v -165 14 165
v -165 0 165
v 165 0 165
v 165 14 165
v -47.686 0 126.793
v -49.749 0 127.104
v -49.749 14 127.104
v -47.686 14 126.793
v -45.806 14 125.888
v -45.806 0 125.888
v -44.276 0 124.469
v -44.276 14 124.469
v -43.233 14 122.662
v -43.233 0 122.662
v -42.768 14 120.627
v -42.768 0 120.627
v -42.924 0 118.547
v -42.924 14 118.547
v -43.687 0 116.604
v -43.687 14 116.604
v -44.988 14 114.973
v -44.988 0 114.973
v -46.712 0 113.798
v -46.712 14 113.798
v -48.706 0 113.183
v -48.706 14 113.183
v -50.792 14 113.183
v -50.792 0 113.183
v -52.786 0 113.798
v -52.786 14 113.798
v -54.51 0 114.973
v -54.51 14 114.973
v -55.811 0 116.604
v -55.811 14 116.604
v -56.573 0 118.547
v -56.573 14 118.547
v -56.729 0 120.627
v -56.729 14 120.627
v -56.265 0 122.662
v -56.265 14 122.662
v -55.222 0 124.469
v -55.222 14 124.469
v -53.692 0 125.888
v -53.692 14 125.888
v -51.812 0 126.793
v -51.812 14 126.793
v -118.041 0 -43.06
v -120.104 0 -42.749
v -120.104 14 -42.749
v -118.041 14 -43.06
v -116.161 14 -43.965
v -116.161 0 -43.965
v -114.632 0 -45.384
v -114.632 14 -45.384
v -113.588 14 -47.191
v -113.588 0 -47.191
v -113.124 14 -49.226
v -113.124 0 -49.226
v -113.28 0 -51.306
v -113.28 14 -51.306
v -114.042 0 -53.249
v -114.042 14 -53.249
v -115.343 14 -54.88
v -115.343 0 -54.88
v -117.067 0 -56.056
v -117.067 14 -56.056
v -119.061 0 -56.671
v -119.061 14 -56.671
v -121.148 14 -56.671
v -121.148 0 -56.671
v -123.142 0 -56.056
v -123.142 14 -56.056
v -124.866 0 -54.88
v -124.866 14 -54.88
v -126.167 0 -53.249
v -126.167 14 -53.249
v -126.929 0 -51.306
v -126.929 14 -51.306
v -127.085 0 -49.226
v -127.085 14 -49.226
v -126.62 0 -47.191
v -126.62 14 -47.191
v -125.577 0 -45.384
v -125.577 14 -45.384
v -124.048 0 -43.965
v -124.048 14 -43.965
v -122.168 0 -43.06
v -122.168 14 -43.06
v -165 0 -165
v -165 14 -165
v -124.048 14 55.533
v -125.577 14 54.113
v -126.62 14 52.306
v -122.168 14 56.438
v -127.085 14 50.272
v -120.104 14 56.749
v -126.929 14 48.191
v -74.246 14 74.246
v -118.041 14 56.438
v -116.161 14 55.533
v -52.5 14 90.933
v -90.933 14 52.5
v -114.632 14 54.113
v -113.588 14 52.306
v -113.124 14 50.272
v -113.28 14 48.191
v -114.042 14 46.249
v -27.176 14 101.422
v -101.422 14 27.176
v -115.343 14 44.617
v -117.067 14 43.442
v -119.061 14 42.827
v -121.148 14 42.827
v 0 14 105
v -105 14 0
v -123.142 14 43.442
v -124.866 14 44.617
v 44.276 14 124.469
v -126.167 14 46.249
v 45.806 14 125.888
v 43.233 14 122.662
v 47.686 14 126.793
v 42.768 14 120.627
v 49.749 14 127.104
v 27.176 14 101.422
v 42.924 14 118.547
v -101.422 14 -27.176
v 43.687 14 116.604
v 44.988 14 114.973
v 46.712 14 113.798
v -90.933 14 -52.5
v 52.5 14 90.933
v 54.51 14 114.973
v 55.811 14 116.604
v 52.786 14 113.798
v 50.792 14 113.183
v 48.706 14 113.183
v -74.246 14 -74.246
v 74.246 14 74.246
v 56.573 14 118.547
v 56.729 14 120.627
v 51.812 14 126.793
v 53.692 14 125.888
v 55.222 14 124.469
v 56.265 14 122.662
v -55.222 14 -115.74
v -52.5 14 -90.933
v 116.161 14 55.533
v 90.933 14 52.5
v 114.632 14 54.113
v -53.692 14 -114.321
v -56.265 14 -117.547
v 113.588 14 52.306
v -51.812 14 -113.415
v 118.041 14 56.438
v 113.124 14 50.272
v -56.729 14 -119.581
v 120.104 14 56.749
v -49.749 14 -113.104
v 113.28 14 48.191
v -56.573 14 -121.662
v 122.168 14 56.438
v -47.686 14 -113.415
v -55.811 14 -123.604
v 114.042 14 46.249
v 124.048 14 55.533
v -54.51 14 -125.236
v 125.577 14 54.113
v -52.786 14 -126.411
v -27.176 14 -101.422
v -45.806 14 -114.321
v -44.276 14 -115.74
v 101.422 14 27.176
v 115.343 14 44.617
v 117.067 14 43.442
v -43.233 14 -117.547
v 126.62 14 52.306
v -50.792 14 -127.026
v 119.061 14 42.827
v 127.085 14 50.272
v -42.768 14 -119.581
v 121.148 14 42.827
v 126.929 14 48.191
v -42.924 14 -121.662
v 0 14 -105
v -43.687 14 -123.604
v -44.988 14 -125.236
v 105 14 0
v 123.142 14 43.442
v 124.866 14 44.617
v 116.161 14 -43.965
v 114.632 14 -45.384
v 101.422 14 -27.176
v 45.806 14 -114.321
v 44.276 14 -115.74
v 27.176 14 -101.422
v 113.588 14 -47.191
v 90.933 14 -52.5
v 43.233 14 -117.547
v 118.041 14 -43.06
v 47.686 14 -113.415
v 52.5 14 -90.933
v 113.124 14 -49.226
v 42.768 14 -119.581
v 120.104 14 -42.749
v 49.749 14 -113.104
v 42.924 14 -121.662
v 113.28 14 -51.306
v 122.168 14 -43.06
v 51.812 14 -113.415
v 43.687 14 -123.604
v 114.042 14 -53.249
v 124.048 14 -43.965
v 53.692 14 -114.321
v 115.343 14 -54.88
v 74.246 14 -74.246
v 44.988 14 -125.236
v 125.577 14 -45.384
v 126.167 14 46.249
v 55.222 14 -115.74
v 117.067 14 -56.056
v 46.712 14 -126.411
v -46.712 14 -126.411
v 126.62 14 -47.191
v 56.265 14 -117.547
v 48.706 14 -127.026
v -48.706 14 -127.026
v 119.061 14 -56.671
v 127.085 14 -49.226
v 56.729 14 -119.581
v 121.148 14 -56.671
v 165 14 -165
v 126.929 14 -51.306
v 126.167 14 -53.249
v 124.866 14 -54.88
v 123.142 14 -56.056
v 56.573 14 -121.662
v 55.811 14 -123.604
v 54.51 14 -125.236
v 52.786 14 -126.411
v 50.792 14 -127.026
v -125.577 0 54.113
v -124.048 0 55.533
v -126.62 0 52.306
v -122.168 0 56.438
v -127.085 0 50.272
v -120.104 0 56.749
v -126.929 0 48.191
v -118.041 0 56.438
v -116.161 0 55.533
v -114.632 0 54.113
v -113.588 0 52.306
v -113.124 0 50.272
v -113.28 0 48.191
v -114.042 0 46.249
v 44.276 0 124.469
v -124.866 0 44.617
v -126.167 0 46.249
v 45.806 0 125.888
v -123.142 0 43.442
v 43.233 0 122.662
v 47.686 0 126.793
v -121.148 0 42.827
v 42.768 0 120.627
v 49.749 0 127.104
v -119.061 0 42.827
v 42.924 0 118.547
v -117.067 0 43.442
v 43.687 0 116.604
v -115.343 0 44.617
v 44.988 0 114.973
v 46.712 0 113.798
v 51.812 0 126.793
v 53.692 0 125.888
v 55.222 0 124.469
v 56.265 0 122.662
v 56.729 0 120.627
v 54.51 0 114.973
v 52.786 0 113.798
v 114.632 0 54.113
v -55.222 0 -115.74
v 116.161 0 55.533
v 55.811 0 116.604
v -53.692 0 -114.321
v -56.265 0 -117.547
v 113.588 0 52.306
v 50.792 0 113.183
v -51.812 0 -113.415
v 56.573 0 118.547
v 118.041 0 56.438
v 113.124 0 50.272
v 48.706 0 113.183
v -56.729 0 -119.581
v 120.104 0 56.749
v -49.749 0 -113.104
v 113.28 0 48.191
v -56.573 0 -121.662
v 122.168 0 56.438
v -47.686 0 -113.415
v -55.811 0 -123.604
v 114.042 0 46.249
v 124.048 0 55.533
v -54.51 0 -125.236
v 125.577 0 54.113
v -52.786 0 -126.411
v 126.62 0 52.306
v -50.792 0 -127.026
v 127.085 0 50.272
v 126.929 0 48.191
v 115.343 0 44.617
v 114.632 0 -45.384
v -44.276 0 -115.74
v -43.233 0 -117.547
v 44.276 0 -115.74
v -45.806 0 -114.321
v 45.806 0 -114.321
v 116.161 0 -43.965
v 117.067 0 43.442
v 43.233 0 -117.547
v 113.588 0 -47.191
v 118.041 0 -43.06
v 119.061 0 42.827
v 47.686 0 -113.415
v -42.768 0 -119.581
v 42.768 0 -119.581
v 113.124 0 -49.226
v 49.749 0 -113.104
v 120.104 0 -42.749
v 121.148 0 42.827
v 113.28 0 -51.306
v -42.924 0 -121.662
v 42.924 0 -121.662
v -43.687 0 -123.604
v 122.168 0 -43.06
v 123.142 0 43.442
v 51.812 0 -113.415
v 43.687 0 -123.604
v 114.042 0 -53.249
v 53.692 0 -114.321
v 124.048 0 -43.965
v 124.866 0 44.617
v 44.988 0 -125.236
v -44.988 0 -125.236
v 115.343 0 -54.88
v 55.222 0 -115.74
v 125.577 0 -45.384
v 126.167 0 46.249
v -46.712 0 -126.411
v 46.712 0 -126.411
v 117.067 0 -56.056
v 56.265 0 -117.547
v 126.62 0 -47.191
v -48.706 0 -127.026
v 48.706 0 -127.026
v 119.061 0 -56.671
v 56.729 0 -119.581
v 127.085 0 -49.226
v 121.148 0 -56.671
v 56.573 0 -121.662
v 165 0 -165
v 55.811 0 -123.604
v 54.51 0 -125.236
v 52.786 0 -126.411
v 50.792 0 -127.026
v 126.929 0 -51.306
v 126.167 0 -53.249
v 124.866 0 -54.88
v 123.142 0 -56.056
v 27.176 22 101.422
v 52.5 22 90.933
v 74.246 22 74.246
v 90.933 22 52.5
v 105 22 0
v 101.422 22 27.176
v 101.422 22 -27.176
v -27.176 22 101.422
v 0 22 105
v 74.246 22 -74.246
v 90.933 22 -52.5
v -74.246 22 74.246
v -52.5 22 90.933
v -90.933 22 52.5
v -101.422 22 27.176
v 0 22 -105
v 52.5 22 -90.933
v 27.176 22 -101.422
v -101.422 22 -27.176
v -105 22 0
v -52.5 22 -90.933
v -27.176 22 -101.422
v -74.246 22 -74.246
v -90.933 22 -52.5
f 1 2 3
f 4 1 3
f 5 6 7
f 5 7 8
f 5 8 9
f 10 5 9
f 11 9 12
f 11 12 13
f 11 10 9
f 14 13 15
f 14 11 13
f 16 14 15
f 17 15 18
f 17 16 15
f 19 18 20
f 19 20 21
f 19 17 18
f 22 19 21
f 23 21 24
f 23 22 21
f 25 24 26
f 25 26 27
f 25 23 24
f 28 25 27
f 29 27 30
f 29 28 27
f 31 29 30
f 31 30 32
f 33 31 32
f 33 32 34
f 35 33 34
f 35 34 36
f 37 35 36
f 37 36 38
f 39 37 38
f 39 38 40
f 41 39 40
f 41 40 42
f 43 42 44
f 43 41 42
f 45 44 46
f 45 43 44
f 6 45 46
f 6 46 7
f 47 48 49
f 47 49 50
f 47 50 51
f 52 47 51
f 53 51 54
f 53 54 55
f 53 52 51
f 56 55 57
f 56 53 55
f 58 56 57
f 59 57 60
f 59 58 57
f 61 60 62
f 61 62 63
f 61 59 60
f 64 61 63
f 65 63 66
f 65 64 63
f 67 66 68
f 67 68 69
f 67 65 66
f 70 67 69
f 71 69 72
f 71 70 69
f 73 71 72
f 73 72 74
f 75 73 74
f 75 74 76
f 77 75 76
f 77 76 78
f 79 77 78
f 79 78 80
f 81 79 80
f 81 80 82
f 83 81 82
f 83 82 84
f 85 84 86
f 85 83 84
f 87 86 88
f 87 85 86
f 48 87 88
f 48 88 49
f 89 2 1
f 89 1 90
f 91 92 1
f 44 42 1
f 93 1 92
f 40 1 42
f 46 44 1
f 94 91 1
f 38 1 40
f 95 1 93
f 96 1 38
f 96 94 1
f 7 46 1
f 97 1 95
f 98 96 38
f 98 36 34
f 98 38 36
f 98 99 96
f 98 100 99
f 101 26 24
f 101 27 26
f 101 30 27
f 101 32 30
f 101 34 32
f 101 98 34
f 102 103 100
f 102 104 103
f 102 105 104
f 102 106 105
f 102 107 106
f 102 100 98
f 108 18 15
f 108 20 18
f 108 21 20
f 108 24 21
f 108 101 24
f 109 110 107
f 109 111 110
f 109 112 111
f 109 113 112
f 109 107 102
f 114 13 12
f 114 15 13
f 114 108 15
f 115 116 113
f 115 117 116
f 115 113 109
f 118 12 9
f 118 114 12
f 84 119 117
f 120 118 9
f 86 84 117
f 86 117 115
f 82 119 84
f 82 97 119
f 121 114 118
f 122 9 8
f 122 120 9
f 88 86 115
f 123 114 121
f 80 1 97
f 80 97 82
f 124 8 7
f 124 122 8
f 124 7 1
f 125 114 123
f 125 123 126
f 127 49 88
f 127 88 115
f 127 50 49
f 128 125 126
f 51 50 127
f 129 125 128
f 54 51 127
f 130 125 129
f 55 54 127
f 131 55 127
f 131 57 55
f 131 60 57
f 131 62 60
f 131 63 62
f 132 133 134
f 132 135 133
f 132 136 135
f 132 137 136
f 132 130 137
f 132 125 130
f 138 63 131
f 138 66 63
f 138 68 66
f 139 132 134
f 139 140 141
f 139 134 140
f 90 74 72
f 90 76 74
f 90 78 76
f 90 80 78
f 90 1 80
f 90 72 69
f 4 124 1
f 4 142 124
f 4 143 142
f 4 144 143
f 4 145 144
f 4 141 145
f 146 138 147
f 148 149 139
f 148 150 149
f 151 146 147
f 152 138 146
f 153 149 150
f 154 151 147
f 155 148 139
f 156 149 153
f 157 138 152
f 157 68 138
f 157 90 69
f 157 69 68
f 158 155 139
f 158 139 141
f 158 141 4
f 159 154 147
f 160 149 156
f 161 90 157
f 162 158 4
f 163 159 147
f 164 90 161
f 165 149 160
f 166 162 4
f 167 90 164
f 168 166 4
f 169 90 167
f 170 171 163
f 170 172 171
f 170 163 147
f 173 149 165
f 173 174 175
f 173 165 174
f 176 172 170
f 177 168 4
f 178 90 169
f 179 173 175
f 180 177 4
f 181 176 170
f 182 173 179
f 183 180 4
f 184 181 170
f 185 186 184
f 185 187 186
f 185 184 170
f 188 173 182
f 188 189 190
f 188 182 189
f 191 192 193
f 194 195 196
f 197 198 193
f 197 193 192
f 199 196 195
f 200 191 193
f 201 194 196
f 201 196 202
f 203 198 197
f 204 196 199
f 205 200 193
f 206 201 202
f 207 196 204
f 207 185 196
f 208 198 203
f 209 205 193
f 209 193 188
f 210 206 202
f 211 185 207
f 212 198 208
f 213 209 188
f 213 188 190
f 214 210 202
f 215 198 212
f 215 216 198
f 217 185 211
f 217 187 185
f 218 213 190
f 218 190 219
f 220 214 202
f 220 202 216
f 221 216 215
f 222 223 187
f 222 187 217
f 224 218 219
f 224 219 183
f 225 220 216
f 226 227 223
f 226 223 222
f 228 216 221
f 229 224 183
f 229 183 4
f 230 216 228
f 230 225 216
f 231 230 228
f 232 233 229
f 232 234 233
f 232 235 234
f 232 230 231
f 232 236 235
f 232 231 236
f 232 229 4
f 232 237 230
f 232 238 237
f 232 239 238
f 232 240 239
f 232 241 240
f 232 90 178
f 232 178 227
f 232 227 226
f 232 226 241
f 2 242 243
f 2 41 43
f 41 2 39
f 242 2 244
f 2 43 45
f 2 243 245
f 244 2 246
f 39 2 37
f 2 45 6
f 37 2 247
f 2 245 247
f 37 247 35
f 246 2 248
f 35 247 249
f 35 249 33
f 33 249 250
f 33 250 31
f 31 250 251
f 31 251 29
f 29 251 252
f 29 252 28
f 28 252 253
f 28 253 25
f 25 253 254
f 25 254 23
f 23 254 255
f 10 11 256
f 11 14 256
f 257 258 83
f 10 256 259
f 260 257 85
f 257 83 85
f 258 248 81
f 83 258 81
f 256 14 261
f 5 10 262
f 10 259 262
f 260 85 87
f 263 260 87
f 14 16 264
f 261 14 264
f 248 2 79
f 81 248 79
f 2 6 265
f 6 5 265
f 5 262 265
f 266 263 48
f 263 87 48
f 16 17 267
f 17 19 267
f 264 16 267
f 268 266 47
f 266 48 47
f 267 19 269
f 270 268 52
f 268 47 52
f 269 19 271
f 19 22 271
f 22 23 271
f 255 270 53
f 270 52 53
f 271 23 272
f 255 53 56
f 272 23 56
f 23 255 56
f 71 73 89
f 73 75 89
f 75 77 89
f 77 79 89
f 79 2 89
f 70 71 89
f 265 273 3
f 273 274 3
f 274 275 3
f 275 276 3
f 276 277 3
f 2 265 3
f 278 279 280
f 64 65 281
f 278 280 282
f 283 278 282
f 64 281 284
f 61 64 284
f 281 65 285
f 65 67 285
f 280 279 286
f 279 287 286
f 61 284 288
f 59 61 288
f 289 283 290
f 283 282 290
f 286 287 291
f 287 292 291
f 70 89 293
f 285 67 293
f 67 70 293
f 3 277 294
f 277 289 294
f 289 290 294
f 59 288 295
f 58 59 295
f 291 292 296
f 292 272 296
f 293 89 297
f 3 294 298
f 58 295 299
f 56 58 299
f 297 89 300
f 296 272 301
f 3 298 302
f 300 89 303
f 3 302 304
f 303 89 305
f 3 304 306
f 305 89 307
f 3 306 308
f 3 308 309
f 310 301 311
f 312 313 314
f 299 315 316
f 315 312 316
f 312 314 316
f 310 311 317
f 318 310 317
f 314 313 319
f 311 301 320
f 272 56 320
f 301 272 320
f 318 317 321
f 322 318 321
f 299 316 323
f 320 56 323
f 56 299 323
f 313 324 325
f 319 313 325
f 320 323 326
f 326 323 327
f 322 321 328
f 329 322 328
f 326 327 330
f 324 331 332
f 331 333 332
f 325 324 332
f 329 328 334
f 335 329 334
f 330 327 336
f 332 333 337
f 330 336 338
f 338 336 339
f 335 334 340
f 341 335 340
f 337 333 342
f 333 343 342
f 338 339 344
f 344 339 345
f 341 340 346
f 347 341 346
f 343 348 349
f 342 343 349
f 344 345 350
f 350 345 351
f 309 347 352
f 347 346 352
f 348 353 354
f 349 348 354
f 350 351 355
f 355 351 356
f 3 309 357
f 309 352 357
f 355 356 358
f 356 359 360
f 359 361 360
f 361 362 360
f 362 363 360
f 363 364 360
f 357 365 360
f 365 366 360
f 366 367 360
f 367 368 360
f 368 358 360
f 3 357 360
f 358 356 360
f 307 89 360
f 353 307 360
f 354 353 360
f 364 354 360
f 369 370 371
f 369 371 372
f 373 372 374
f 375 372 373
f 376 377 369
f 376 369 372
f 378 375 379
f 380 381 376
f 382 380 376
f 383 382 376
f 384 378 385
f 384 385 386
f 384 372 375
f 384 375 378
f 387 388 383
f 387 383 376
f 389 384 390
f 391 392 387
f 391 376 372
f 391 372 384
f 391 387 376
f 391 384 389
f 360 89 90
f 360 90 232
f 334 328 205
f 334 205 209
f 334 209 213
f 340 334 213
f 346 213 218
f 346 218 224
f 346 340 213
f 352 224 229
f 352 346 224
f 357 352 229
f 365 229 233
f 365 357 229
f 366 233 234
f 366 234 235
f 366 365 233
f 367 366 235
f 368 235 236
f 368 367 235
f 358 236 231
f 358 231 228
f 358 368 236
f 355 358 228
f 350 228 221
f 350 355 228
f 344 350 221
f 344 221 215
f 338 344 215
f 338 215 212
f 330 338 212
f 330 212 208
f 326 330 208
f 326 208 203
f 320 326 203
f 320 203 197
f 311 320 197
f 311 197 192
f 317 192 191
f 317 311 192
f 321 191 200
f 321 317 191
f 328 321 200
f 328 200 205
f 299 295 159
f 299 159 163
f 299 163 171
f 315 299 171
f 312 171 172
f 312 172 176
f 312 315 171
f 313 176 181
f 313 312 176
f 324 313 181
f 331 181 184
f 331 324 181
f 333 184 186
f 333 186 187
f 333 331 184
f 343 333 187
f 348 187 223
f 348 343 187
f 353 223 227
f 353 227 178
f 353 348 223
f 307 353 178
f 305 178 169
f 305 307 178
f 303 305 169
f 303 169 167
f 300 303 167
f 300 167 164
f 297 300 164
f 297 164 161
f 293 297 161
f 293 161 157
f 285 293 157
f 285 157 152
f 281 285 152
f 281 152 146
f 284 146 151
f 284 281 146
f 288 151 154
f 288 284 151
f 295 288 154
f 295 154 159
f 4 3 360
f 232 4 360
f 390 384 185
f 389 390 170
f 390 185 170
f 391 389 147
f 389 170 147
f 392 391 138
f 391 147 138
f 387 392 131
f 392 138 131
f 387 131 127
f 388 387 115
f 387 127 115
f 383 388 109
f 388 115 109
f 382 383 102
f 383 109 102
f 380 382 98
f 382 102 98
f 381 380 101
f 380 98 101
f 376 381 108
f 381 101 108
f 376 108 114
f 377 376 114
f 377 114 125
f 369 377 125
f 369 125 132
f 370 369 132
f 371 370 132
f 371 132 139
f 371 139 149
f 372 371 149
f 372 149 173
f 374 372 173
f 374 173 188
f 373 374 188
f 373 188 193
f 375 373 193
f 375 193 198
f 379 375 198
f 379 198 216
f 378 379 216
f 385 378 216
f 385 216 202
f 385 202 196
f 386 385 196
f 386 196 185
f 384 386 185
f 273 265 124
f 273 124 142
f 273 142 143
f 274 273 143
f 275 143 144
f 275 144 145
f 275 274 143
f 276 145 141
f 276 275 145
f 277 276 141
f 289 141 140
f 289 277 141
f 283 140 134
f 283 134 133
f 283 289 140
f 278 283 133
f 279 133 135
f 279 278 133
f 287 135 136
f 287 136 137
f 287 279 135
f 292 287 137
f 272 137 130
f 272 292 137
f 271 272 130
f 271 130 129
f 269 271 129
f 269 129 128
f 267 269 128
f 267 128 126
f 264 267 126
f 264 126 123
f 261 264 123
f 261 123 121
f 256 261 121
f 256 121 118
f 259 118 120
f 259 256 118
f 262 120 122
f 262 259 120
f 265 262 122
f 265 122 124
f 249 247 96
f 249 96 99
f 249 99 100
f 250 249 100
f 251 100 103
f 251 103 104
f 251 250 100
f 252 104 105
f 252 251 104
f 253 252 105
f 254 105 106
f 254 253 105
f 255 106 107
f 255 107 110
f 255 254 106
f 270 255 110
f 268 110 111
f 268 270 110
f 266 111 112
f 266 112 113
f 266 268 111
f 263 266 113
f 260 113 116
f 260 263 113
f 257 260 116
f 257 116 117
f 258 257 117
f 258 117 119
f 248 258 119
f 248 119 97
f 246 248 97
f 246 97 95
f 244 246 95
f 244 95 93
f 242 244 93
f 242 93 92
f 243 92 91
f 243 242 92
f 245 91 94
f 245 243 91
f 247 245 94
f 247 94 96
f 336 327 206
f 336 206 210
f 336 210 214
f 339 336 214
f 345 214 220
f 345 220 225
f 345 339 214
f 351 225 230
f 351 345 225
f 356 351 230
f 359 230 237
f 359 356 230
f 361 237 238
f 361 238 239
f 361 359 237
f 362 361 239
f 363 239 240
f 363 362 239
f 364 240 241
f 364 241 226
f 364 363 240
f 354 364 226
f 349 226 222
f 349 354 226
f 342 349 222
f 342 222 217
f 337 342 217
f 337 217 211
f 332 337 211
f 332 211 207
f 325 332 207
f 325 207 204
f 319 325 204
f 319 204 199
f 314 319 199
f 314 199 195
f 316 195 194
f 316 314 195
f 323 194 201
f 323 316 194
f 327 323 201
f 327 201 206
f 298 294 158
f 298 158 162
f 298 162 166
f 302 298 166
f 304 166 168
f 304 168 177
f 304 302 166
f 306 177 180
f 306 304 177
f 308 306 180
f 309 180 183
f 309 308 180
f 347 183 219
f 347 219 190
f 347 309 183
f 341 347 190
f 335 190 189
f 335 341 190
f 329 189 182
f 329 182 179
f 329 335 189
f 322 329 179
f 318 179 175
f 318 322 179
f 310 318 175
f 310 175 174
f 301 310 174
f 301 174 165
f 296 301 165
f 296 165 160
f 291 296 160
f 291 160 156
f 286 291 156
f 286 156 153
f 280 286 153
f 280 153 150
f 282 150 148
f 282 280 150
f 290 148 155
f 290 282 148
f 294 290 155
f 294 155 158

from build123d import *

# Parameters (mm, degrees)
F_01_BASE_PROFILE_W           = 330
F_01_BASE_PROFILE_H           = 330
F_01_BASE_PROFILE_R           = 7
F_01_BASE_PROFILE_R_2         = 5.248628476
F_01_BASE_PROFILE_R_3         = 5.751371524
F_01_BASE_EXTRUDE_DEPTH       = 14
F_02_BOSS_PROFILE_R           = 105
F_02_REINFORCEMENT_BOSS_DEPTH = 22


with BuildPart() as part:
    # 01_Base_Profile → 01_Base_Extrude (new body)
    with BuildSketch(Plane(origin=(0, 0, 0), x_dir=(1, 0, 0), z_dir=(0, 1, 0))):
        Rectangle(F_01_BASE_PROFILE_W, F_01_BASE_PROFILE_H)
        with Locations(Location((120.104339226, 49.748846207, 0), (0, 0, 270))):
            Circle(F_01_BASE_PROFILE_R, mode=Mode.SUBTRACT)
        with Locations(Location((49.748846207, 120.104339226, 0), (0, 0, 270))):
            Circle(F_01_BASE_PROFILE_R, mode=Mode.SUBTRACT)
        with Locations(Location((-49.748846207, 120.104339226, 0), (0, 0, 270))):
            Circle(F_01_BASE_PROFILE_R, mode=Mode.SUBTRACT)
        with Locations(Location((-120.104339226, 49.748846207, 0), (0, 0, 270))):
            Circle(F_01_BASE_PROFILE_R, mode=Mode.SUBTRACT)
        with Locations(Location((-120.104339226, -49.748846207, 0), (0, 0, 270))):
            Circle(F_01_BASE_PROFILE_R, mode=Mode.SUBTRACT)
        with Locations(Location((-49.748846207, -120.104339226, 0), (0, 0, 270))):
            Circle(F_01_BASE_PROFILE_R, mode=Mode.SUBTRACT)
        with Locations(Location((49.748846207, -120.104339226, 0), (0, 0, 270))):
            Circle(F_01_BASE_PROFILE_R, mode=Mode.SUBTRACT)
        with Locations(Location((120.104339226, -49.748846207, 0), (0, 0, 270))):
            Circle(F_01_BASE_PROFILE_R, mode=Mode.SUBTRACT)
        with Locations(Location((49.748846207, 49.748846207, 0), (0, 0, 270))):
            Circle(F_01_BASE_PROFILE_R_2, mode=Mode.SUBTRACT)
        with Locations(Location((-49.748846207, 49.748846207, 0), (0, 0, 270))):
            Circle(F_01_BASE_PROFILE_R_3, mode=Mode.SUBTRACT)
        with Locations(Location((-49.748846207, -49.748846207, 0), (0, 0, 270))):
            Circle(F_01_BASE_PROFILE_R_3, mode=Mode.SUBTRACT)
        with Locations(Location((49.748846207, -49.748846207, 0), (0, 0, 270))):
            Circle(F_01_BASE_PROFILE_R_2, mode=Mode.SUBTRACT)
    extrude(amount=F_01_BASE_EXTRUDE_DEPTH)

    # 02_Boss_Profile → 02_Reinforcement_Boss (add)
    with BuildSketch(Plane(origin=(0, 0, 0), x_dir=(1, 0, 0), z_dir=(0, 1, 0))):
        with Locations(Location((0, 0, 0), (0, 0, 90))):
            Circle(F_02_BOSS_PROFILE_R)
    extrude(amount=F_02_REINFORCEMENT_BOSS_DEPTH)


solid = part.part
